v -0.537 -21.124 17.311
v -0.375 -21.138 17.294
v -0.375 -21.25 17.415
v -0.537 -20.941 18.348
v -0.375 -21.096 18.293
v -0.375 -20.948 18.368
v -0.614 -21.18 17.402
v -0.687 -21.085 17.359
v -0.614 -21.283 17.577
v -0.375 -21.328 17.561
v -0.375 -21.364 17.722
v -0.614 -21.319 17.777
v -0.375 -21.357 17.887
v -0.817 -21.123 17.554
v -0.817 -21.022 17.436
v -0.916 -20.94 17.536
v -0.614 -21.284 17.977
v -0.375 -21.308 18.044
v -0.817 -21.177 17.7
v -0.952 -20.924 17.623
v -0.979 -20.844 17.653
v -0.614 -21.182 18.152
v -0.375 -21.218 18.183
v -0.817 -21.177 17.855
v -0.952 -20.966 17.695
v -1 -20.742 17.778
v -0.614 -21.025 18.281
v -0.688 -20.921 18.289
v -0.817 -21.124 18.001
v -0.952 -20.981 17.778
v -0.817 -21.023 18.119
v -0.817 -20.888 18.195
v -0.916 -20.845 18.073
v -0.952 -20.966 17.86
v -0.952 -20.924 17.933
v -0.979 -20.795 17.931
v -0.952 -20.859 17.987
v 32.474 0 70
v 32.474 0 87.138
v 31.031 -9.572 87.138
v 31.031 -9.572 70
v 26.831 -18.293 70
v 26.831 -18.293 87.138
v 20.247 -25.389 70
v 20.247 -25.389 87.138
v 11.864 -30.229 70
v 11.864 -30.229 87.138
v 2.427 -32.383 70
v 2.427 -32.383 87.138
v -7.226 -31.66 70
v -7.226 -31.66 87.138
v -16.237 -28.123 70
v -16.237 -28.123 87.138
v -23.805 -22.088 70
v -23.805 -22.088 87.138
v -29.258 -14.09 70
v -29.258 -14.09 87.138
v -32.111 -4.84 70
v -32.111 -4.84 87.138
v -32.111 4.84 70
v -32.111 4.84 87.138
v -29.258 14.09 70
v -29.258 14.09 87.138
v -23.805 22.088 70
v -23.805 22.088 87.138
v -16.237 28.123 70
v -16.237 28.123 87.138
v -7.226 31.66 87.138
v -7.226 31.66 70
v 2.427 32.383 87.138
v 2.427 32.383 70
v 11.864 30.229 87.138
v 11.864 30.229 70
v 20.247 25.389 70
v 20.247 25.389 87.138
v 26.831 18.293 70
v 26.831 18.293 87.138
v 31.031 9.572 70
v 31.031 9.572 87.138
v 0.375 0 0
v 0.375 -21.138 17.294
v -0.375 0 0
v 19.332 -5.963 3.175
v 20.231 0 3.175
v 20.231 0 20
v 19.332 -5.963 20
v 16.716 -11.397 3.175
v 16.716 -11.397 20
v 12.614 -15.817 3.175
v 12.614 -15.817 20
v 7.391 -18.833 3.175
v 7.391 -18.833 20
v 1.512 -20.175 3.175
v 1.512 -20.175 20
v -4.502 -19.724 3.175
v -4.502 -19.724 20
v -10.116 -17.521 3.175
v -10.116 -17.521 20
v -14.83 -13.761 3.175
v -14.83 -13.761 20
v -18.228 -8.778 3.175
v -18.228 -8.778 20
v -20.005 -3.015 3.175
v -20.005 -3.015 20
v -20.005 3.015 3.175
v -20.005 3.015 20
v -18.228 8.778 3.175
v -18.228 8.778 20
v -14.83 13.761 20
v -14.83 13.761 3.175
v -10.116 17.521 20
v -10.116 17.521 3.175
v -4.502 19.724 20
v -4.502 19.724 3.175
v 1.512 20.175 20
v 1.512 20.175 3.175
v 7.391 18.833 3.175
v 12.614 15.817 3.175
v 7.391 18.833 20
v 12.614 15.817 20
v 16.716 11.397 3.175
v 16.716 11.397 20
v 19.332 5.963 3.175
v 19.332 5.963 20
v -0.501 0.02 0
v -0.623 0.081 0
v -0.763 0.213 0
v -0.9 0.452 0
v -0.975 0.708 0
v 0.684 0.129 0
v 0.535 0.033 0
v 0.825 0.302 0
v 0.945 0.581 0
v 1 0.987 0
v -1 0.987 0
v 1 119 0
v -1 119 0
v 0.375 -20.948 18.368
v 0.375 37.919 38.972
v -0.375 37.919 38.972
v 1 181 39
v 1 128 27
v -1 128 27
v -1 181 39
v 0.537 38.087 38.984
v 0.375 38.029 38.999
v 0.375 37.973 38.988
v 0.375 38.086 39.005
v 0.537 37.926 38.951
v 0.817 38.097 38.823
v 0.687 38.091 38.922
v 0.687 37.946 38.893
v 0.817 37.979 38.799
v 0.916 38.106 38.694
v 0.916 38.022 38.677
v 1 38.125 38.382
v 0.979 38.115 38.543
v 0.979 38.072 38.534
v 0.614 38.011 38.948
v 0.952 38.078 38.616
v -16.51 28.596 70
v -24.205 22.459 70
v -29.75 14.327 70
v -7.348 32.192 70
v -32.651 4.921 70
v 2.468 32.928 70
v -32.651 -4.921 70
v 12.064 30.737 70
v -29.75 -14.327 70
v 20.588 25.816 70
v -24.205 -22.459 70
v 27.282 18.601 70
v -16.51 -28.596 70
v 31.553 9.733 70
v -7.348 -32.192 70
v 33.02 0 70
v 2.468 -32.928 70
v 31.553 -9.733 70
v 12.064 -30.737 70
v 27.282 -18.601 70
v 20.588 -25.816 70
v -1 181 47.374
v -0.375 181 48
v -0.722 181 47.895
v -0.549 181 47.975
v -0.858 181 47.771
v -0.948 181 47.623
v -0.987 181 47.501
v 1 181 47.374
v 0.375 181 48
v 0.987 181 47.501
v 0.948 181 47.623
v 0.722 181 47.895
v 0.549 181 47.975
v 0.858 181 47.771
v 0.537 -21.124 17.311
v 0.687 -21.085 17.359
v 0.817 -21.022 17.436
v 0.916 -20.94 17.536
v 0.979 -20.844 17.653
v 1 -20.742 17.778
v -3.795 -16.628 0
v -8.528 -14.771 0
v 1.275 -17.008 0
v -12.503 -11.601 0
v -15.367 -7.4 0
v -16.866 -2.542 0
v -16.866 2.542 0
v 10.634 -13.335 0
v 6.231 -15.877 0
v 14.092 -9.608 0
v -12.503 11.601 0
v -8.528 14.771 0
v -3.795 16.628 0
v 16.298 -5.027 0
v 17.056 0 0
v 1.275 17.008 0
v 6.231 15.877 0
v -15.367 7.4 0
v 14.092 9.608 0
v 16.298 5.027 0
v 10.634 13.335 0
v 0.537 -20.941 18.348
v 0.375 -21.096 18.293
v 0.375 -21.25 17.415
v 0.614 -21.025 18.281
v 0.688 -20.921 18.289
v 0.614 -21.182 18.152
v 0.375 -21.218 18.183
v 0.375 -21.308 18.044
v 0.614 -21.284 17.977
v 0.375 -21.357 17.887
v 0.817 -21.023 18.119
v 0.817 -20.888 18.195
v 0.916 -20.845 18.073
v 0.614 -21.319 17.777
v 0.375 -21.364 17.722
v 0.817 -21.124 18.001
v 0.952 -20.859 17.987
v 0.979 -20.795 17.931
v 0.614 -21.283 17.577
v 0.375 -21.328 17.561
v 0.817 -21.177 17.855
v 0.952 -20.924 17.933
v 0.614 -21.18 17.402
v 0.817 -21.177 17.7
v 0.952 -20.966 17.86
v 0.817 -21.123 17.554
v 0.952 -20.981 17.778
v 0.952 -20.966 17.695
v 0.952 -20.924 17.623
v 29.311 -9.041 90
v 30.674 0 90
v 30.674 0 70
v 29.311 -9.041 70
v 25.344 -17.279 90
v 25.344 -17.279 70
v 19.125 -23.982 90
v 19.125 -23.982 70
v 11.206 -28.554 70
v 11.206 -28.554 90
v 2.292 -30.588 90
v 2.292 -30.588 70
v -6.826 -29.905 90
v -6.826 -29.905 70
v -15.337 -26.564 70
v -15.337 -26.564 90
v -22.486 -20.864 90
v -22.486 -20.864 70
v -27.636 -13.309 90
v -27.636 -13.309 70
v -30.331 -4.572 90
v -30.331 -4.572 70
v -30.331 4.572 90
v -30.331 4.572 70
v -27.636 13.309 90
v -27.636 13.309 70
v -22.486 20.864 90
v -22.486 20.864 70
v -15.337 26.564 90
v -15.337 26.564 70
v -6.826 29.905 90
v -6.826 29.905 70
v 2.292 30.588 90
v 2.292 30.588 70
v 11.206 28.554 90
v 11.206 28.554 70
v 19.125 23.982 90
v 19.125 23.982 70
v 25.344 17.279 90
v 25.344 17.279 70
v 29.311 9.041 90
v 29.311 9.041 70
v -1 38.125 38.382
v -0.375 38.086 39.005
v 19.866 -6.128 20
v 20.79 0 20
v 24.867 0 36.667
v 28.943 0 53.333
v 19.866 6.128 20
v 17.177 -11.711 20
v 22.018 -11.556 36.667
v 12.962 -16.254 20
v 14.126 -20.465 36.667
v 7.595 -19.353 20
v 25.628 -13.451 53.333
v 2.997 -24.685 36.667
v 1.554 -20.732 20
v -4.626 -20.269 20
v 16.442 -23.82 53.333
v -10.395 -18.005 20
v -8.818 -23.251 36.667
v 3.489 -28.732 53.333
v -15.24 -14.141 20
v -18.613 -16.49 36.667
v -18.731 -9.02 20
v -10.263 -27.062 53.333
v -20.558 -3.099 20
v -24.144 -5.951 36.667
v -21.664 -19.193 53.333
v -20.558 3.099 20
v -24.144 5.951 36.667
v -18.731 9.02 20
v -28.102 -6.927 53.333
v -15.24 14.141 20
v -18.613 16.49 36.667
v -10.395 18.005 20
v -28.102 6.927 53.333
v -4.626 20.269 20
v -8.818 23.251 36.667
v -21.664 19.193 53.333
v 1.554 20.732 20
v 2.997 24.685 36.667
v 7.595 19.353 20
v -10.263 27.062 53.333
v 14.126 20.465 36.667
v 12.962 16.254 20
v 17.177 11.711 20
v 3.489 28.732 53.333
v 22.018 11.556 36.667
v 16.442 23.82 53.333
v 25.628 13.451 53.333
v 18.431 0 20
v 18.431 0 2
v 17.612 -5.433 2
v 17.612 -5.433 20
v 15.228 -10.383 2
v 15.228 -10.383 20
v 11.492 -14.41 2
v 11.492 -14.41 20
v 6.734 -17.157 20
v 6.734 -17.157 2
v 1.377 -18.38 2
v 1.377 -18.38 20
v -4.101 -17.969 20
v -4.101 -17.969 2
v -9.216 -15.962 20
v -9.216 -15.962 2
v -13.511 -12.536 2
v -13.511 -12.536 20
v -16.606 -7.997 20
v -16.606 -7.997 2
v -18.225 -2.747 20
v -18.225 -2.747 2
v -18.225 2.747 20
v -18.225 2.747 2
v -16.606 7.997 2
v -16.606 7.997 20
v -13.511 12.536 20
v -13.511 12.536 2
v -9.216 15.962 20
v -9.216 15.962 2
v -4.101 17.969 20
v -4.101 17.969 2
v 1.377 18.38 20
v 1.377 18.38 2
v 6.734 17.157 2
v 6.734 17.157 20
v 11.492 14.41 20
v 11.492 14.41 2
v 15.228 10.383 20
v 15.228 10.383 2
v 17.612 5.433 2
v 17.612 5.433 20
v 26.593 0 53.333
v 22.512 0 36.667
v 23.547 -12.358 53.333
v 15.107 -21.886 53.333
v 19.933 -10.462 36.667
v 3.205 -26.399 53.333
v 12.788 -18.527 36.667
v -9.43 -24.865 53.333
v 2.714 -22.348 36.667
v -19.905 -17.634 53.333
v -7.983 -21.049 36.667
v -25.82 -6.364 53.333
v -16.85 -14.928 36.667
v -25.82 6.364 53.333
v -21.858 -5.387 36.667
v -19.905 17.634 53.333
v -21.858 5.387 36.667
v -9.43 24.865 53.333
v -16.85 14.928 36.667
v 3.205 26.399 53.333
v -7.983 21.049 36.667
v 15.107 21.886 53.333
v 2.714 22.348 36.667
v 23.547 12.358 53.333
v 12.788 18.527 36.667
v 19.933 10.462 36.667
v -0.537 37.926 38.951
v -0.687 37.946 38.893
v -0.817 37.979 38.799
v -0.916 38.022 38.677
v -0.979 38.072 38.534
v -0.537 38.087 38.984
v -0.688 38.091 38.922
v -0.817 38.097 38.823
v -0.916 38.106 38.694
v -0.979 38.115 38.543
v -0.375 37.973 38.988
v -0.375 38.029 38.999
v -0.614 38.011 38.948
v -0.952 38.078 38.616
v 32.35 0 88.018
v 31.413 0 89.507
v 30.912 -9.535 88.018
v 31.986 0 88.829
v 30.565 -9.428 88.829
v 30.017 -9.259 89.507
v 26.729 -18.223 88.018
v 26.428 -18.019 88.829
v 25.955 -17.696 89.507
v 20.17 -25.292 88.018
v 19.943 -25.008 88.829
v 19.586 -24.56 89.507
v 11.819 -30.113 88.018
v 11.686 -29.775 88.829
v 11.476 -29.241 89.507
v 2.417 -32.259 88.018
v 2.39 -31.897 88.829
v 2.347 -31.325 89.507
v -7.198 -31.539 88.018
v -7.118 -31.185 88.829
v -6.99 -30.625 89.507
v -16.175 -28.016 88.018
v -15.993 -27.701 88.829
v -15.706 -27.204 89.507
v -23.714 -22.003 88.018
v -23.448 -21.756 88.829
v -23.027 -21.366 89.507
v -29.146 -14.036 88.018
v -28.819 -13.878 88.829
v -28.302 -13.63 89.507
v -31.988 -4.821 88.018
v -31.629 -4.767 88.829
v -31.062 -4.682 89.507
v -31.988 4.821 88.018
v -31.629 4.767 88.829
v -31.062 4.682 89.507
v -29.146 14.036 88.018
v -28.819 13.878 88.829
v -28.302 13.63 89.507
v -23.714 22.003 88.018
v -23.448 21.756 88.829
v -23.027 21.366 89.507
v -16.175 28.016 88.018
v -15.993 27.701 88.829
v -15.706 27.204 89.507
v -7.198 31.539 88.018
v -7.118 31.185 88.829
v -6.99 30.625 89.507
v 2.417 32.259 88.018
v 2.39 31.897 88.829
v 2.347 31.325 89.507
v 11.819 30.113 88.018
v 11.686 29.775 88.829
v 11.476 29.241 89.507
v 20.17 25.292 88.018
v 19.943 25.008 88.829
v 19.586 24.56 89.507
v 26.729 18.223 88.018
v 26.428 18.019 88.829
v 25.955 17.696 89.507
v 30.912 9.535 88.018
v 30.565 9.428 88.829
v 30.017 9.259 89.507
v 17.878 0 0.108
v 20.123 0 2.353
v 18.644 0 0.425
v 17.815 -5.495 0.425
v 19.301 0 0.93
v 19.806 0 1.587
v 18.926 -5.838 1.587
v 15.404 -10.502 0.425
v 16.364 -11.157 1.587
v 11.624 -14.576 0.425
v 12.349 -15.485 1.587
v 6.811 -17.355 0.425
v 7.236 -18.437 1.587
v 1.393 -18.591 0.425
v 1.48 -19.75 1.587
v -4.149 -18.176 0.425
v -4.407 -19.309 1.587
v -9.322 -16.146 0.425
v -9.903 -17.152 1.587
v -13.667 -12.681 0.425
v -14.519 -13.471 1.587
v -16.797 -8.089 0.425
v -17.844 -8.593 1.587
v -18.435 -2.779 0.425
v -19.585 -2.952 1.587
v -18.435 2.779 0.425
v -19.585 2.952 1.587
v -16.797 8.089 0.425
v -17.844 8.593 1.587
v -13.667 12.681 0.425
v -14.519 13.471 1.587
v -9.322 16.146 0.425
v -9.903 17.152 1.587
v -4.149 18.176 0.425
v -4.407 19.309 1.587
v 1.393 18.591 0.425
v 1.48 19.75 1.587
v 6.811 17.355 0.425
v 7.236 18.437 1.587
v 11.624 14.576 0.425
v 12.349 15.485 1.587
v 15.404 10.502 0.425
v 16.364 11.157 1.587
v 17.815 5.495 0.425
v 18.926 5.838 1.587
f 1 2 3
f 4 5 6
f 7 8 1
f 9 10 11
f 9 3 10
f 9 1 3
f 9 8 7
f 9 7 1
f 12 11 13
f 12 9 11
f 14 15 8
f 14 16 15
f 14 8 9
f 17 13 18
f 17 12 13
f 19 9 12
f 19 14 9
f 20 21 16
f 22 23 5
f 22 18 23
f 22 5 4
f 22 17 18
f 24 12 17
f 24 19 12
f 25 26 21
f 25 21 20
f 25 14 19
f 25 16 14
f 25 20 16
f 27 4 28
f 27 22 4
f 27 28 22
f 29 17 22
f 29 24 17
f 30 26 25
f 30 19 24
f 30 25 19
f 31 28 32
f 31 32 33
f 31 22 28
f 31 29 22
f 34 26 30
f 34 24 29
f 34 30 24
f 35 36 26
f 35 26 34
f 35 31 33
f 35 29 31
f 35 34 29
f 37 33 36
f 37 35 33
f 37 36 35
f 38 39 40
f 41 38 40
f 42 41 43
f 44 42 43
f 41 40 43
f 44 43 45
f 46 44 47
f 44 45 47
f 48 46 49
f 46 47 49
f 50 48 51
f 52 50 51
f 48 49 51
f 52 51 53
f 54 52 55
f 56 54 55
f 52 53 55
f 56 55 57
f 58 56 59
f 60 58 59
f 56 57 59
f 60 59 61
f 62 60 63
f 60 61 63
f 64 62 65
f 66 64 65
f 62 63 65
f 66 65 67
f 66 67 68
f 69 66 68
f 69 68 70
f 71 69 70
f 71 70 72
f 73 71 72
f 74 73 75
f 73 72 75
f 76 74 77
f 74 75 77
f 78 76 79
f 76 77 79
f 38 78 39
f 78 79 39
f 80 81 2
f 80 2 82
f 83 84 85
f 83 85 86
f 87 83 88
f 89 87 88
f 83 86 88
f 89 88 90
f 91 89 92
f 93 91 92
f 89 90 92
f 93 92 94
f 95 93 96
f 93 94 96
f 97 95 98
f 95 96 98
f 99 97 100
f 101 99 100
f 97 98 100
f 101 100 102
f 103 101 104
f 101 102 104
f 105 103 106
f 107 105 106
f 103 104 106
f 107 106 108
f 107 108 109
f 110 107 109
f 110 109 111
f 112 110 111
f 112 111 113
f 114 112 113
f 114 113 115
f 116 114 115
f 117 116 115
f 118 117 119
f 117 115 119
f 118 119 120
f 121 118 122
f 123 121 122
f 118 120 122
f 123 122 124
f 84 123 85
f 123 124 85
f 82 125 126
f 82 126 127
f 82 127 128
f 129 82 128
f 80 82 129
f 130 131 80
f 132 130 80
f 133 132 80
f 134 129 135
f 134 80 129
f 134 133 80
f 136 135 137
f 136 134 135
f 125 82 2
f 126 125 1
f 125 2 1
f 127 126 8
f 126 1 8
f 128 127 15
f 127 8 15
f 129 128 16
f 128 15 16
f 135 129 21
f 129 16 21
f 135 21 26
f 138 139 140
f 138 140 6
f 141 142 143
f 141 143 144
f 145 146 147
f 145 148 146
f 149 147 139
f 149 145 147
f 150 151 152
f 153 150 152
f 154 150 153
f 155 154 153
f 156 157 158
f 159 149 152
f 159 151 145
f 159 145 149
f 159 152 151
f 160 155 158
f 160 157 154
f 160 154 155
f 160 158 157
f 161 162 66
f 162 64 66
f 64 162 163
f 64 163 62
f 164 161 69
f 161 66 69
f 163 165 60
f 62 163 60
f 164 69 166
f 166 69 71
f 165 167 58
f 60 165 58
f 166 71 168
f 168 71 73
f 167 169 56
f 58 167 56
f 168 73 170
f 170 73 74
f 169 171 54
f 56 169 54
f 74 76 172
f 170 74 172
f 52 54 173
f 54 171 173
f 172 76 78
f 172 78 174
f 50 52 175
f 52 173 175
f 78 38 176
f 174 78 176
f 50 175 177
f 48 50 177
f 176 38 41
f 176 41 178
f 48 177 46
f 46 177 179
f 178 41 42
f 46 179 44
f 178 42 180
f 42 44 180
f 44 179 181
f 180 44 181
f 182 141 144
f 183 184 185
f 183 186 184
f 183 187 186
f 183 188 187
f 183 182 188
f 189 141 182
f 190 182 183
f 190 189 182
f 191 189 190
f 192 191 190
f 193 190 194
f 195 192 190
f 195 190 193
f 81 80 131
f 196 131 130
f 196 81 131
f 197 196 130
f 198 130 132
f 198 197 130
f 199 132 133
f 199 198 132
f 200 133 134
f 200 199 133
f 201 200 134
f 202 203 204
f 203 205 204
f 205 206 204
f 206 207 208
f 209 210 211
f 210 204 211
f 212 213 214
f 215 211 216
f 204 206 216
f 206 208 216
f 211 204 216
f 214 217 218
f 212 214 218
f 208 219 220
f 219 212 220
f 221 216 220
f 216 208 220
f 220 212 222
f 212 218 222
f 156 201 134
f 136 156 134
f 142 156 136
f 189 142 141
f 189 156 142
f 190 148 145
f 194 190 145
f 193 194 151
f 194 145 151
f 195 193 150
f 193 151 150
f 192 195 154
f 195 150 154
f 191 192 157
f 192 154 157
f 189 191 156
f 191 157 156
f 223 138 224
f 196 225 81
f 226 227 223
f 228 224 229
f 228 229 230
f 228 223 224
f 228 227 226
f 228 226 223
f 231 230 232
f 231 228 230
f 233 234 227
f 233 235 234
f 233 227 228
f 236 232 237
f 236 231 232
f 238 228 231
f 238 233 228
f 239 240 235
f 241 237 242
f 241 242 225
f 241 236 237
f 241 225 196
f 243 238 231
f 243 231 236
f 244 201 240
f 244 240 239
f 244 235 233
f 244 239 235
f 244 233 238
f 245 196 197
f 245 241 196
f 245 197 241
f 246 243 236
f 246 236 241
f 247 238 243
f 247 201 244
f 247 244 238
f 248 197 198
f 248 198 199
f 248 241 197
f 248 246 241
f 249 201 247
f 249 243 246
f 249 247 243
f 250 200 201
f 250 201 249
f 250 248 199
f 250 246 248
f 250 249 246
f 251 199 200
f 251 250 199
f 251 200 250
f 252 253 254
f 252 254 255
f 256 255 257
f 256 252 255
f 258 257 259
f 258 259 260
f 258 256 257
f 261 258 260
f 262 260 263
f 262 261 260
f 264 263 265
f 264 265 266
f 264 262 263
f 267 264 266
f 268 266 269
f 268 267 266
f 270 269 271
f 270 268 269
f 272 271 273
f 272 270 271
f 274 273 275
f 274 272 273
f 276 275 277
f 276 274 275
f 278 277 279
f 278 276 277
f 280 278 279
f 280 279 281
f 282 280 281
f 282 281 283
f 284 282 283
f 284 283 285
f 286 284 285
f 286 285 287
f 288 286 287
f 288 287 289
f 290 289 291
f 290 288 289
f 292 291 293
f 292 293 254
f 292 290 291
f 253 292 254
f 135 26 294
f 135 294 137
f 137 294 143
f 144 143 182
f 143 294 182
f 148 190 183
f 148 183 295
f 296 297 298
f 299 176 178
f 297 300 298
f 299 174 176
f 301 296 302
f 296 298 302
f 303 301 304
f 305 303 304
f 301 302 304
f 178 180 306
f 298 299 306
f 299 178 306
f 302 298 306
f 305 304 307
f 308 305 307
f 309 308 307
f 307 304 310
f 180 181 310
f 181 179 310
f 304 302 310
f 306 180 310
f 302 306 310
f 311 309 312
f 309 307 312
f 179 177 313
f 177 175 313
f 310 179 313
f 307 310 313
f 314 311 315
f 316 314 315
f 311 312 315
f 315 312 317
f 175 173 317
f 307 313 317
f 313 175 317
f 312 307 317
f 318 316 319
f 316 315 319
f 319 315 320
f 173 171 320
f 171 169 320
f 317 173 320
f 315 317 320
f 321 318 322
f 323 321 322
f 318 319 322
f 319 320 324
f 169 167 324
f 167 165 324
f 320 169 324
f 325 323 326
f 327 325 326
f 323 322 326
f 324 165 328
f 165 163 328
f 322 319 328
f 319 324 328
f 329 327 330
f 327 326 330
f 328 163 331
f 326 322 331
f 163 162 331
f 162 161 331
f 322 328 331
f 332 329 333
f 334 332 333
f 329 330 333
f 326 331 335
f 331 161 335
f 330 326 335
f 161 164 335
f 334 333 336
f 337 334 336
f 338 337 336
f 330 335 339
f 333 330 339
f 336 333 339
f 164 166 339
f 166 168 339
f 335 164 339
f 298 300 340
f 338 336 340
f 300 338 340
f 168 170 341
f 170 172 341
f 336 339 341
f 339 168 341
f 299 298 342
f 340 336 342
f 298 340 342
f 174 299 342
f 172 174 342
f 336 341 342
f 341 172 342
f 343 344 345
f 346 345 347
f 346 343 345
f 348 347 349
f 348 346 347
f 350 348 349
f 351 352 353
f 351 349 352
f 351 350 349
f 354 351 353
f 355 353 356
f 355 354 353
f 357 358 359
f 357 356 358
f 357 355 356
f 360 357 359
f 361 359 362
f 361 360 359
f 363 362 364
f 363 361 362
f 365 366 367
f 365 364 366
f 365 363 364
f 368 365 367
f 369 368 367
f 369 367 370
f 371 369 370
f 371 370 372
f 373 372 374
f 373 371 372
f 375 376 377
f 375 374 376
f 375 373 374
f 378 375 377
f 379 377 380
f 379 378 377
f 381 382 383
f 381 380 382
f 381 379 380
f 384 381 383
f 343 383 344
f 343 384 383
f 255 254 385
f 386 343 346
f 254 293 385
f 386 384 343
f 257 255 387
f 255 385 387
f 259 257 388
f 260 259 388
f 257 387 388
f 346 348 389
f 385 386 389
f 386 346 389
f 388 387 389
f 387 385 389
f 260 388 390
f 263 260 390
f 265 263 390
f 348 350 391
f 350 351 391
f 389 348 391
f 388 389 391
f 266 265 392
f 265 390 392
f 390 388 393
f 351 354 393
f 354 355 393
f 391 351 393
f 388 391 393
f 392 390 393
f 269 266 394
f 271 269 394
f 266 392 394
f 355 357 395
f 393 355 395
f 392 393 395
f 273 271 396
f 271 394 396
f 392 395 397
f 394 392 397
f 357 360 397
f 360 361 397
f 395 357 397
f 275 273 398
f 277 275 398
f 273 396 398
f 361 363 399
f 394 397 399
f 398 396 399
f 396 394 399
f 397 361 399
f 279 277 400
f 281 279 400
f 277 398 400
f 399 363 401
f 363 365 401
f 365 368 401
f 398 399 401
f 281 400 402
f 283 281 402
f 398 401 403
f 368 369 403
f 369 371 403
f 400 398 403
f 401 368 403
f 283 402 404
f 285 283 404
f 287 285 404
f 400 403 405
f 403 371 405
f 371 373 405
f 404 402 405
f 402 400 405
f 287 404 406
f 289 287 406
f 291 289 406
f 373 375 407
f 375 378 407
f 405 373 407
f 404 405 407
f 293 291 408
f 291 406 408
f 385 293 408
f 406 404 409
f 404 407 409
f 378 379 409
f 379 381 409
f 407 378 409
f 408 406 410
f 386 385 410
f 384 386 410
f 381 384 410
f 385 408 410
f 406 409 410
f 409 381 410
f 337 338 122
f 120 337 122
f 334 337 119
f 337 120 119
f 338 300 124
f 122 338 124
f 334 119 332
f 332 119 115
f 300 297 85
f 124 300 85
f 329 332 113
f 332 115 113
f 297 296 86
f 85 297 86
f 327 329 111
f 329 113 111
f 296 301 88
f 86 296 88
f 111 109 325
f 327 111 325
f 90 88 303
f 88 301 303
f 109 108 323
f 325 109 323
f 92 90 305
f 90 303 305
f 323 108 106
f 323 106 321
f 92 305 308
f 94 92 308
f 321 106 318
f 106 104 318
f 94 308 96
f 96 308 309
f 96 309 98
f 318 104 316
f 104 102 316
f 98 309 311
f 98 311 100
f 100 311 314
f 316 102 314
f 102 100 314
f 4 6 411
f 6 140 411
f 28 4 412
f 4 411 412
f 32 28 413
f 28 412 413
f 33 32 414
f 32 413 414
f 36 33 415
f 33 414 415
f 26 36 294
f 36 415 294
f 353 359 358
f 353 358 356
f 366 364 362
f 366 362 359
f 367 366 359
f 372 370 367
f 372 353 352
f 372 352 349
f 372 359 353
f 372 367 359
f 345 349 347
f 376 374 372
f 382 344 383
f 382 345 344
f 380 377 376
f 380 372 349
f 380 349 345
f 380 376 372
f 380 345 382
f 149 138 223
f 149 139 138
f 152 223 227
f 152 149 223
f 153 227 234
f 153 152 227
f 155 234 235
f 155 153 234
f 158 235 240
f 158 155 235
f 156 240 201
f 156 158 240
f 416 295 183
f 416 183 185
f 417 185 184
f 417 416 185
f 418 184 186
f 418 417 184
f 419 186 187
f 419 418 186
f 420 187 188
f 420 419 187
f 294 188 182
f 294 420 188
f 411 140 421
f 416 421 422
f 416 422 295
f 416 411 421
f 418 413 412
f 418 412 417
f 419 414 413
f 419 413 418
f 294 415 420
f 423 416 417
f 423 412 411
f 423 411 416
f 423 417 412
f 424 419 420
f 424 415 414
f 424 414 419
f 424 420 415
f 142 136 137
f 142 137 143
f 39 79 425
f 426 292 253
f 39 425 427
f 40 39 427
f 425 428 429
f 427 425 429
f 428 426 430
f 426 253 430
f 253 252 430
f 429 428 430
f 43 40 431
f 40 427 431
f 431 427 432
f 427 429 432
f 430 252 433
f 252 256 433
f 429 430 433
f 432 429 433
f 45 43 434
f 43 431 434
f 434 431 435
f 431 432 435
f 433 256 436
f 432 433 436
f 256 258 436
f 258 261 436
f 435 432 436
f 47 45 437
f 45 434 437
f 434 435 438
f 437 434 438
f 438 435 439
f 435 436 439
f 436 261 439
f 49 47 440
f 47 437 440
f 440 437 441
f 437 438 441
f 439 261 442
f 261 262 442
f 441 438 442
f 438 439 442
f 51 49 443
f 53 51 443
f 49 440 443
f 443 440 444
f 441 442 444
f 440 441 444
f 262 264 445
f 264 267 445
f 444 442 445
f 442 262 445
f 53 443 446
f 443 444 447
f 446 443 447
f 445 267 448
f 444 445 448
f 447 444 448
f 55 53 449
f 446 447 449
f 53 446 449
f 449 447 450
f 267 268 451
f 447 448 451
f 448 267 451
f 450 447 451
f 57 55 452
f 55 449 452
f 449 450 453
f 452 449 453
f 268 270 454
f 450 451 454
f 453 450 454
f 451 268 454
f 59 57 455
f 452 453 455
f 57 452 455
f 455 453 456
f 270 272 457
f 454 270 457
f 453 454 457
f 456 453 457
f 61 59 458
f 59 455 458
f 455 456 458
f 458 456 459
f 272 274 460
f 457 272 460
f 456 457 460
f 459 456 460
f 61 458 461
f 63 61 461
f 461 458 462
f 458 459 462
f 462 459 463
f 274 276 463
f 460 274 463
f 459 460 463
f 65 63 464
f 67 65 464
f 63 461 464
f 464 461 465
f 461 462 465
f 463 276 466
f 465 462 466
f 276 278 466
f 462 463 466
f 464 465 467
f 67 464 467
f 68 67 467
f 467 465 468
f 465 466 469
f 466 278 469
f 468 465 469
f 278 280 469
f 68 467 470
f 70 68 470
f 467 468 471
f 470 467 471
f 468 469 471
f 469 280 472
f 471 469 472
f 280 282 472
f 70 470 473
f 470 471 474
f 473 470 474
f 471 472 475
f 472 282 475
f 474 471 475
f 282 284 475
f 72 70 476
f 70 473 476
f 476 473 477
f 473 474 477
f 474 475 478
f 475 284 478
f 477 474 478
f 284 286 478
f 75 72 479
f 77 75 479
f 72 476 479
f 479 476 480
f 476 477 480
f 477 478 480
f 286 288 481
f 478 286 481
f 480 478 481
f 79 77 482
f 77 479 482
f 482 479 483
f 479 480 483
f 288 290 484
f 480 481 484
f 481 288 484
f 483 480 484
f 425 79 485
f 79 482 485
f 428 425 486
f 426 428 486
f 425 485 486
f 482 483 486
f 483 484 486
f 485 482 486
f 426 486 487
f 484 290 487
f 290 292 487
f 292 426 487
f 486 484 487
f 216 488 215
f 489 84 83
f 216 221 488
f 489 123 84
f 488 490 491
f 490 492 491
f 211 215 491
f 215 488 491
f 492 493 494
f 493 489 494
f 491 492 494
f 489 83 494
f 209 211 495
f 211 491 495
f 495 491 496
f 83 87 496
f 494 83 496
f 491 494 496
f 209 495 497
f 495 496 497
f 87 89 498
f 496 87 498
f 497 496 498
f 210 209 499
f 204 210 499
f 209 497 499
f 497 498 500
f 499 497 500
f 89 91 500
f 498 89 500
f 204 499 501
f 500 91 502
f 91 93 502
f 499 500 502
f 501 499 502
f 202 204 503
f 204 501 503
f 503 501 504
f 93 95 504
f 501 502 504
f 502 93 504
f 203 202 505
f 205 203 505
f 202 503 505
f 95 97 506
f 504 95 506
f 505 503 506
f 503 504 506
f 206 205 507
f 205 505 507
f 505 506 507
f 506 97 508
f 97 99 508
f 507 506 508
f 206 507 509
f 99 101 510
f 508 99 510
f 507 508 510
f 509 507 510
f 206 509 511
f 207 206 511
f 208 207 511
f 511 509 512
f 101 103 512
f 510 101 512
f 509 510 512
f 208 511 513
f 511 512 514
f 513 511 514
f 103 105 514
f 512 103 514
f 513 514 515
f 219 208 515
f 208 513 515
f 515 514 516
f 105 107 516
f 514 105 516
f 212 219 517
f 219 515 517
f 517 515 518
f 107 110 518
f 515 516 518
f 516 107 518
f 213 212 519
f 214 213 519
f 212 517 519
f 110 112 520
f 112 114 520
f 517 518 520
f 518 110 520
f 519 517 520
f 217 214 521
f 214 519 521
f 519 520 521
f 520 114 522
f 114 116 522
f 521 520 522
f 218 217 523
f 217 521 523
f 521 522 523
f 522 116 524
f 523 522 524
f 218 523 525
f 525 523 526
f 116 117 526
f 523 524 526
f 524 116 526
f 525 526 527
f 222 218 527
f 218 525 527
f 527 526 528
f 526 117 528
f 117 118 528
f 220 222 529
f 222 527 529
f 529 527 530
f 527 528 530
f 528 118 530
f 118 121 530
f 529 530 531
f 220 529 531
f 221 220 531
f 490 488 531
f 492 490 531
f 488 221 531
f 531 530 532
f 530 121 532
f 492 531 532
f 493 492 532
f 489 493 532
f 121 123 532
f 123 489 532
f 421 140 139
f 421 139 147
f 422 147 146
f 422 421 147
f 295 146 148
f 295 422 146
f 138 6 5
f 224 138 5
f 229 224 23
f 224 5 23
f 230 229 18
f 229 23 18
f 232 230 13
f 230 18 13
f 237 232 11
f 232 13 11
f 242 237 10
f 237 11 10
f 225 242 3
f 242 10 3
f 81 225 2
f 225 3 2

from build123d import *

# Parameters (mm, degrees)
F1_DEPTH     = 1
F2_R         = 0.625
F3_T1_DEPTH  = 65.0452526587
F3_T3_DEPTH  = 0.75
F3_T8_DEPTH  = 0.625
F3_T14_DEPTH = 0.625
F4_T1_DEPTH  = 28.8736358303
F4_T3_DEPTH  = 0.75
F4_T8_DEPTH  = 0.625
F4_T14_DEPTH = 0.625
F5_W         = 1.79999894
F5_H         = 20.0000108
F7_R         = 18.43110106
F8_DEPTH     = 2.00000108
F9_R         = 3.175


# Not quite as in the source:
# - a fillet or chamfer that OpenCascade refuses, or shapes differently, is made with other operations: its cross-section is extruded or revolved along the edge and cut away or added
# - a feature names something its author has since deleted; it is built from what else it names


with BuildPart() as f1:
    # F0 (on Right) → F1 (new body, symmetric)
    with BuildSketch(Plane.YZ):
        Polygon((-22, 18), (0, 0), (119, 0), (128, 27), (181, 39), (181, 48), (38, 39), align=None)
    extrude(amount=F1_DEPTH, both=True)

    # F2
    f2_edges = [f1.edges().sort_by_distance(p)[0] for p in [
        (1, 109.5, 43.5),
        (-1, 109.5, 43.5),
    ]]
    fillet(f2_edges, radius=F2_R)

    # F3: fillet of radius 0.625 on 2 edges, made by hand

    # F3_s2 → F3_t1 (cut)
    with BuildSketch(Plane(origin=(0, 45.932089611, 16.0762313638), x_dir=(1, 0, 0), z_dir=(0, -0.9438583564, -0.3303504247))):
        with BuildLine():
            ThreePointArc((-0.375, 24.2571597586), (-0.8169417382, 24.0741014968), (-1, 23.6321597586))
            Line((-1, 23.6321597586), (-1, 24.2571597586))
            Line((-1, 24.2571597586), (-0.375, 24.2571597586))
        make_face()
        with BuildLine():
            ThreePointArc((0.375, 24.2571597586), (0.8169417382, 24.0741014968), (1, 23.6321597586))
            Line((1, 23.6321597586), (1, 24.2571597586))
            Line((1, 24.2571597586), (0.375, 24.2571597586))
        make_face()
    extrude(amount=F3_T1_DEPTH, mode=Mode.SUBTRACT)

    # F3_s4 → F3_t3 (cut)
    with BuildSketch(Plane.YZ.offset(-0.375)):
        with BuildLine():
            ThreePointArc((37.918726582, 38.9715543037), (38.0011715289, 38.994213668), (38.0859376082, 39.0054086607))
            Line((38.0859376082, 39.0054086607), (38, 39))
            Line((38, 39), (37.918726582, 38.9715543037))
        make_face()
    extrude(amount=F3_T3_DEPTH, mode=Mode.SUBTRACT)


with BuildPart() as f3_tool6:
    # F3_s7 → F3_t8 (new body)
    with BuildSketch(Plane.YZ.offset(0.375)):
        Polygon((38.1251955975, 38.381642831), (37.918726582, 38.9715543037), (38, 39), (38.0859376082, 39.0054086607), align=None)
    extrude(amount=F3_T8_DEPTH)

    # F3_s9 → F3_t10 (revolve, cut)
    with BuildSketch(Plane(origin=(0.375, 38.1251955975, 38.381642831), x_dir=(0, 0.1984385097, -0.9801133393), z_dir=(0, -0.9801133393, -0.1984385097))):
        with BuildLine():
            ThreePointArc((0, -0.625), (0.625, 0), (0, 0.625))
            Line((0, 0.625), (0, -0.625))
        make_face()
    revolve(axis=Axis((0.375, 38.1251955975, 38.381642831), (1, 0, 0)), mode=Mode.SUBTRACT)


with BuildPart() as f1_1:
    add(f1.part)

    # F3_t5: cut F3_tool6
    add(f3_tool6.part, mode=Mode.SUBTRACT)


with BuildPart() as f3_tool12:
    # F3_s13 → F3_t14 (new body)
    with BuildSketch(Plane.YZ.offset(-0.375)):
        Polygon((38.1251955975, 38.381642831), (38.0859376082, 39.0054086607), (38, 39), (37.918726582, 38.9715543037), align=None)
    extrude(amount=-F3_T14_DEPTH)

    # F3_s15 → F3_t16 (revolve, cut)
    with BuildSketch(Plane(origin=(-0.375, 38.1251955975, 38.381642831), x_dir=(0, 0.1984385097, -0.9801133393), z_dir=(0, 0.9801133393, 0.1984385097))):
        with BuildLine():
            ThreePointArc((0, -0.625), (0.625, 0), (0, 0.625))
            Line((0, 0.625), (0, -0.625))
        make_face()
    revolve(axis=Axis((-0.375, 38.1251955975, 38.381642831), (-1, 0, 0)), mode=Mode.SUBTRACT)


with BuildPart() as f1_2:
    add(f1_1.part)

    # F3_t11: cut F3_tool12
    add(f3_tool12.part, mode=Mode.SUBTRACT)

    # F4: fillet of radius 0.625 on 3 edges, made by hand

    # F4_s2 → F4_t1 (cut)
    with BuildSketch(Plane(origin=(0, -21.1376529254, 17.2944433026), x_dir=(1, 0, 0), z_dir=(0, 0.7739572992, -0.6332377903))):
        with BuildLine():
            ThreePointArc((0.375, 0), (0.8169417382, -0.1830582618), (1, -0.625))
            Line((1, -0.625), (1, 0))
            Line((1, 0), (0.375, 0))
        make_face()
        with BuildLine():
            ThreePointArc((-0.375, 0), (-0.8169417382, -0.1830582618), (-1, -0.625))
            Line((-1, -0.625), (-1, 0))
            Line((-1, 0), (-0.375, 0))
        make_face()
    extrude(amount=F4_T1_DEPTH, mode=Mode.SUBTRACT)

    # F4_s4 → F4_t3 (cut)
    with BuildSketch(Plane.YZ.offset(-0.375)):
        with BuildLine():
            ThreePointArc((-20.9483483219, 18.3680780873), (-21.3573847576, 17.8866932915), (-21.1376529254, 17.2944433026))
            Line((-21.1376529254, 17.2944433026), (-22, 18))
            Line((-22, 18), (-20.9483483219, 18.3680780873))
        make_face()
    extrude(amount=F4_T3_DEPTH, mode=Mode.SUBTRACT)


with BuildPart() as f4_tool6:
    # F4_s7 → F4_t8 (new body)
    with BuildSketch(Plane.YZ.offset(0.375)):
        Polygon((-20.7418793065, 17.7781666146), (-21.1376529254, 17.2944433026), (-22, 18), (-20.9483483219, 18.3680780873), align=None)
    extrude(amount=F4_T8_DEPTH)

    # F4_s9 → F4_t10 (revolve, cut)
    with BuildSketch(Plane(origin=(0.375, -20.7418793065, 17.7781666146), x_dir=(0, 0.9848087219, -0.173642683), z_dir=(0, -0.173642683, -0.9848087219))):
        with BuildLine():
            ThreePointArc((0, -0.625), (0.625, 0), (0, 0.625))
            Line((0, 0.625), (0, -0.625))
        make_face()
    revolve(axis=Axis((0.375, -20.7418793065, 17.7781666146), (1, 0, 0)), mode=Mode.SUBTRACT)


with BuildPart() as f1_3:
    add(f1_2.part)

    # F4_t5: cut F4_tool6
    add(f4_tool6.part, mode=Mode.SUBTRACT)


with BuildPart() as f4_tool12:
    # F4_s13 → F4_t14 (new body)
    with BuildSketch(Plane.YZ.offset(-0.375)):
        Polygon((-20.7418793065, 17.7781666146), (-21.1376529254, 17.2944433026), (-22, 18), (-20.9483483219, 18.3680780873), align=None)
    extrude(amount=-F4_T14_DEPTH)

    # F4_s15 → F4_t16 (revolve, cut)
    with BuildSketch(Plane(origin=(-0.375, -20.7418793065, 17.7781666146), x_dir=(0, 0.9848087219, -0.173642683), z_dir=(0, 0.173642683, 0.9848087219))):
        with BuildLine():
            ThreePointArc((0, -0.625), (0.625, 0), (0, 0.625))
            Line((0, 0.625), (0, -0.625))
        make_face()
    revolve(axis=Axis((-0.375, -20.7418793065, 17.7781666146), (-1, 0, 0)), mode=Mode.SUBTRACT)


with BuildPart() as f1_4:
    add(f1_3.part)

    # F4_t11: cut F4_tool12
    add(f4_tool12.part, mode=Mode.SUBTRACT)


with BuildPart() as f6:
    # F5 (on Front) → F6 (revolve)
    with BuildSketch(Plane.XZ):
        Polygon((32.4739, 69.9999108), (30.67390106, 69.9999108), (18.43110106, 20.0000108), (20.2311, 20.0000108), (20.7899, 20.0000108), (33.02, 69.9999108), align=None)
        with Locations((19.33110053, 10.0000054)):
            Rectangle(F5_W, F5_H)
        with Locations((31.57390053, 79.9999162)):
            Rectangle(F5_W, F5_H)
    revolve(axis=Axis((0, 0, -0.9119894143), (0, 0, -1)))

    # F7 (on Top) → F8 (join)
    with BuildSketch(Plane.XY):
        Circle(F7_R)
    extrude(amount=F8_DEPTH)

    # F9
    f9_edges = [f6.edges().sort_by_distance(p)[0] for p in [
        (-20.2311, 0, 0),
    ]]
    fillet(f9_edges, radius=F9_R)

    # F10: fillet of radius 3.175 on 1 edges, made by hand

    # F10_s1 → F10_t2 (revolve, cut)
    with BuildSketch(Plane.XZ):
        with BuildLine():
            ThreePointArc((32.4739, 87.138104505), (31.9864875209, 88.8285181577), (30.67390106, 89.9999216))
            Line((30.67390106, 89.9999216), (32.4739, 89.9999216))
            Line((32.4739, 89.9999216), (32.4739, 87.138104505))
        make_face()
    revolve(axis=Axis((0, 0, 89.9999216), (0, 0, -1)), mode=Mode.SUBTRACT)


solid = Compound([f1_4.part, f6.part])
